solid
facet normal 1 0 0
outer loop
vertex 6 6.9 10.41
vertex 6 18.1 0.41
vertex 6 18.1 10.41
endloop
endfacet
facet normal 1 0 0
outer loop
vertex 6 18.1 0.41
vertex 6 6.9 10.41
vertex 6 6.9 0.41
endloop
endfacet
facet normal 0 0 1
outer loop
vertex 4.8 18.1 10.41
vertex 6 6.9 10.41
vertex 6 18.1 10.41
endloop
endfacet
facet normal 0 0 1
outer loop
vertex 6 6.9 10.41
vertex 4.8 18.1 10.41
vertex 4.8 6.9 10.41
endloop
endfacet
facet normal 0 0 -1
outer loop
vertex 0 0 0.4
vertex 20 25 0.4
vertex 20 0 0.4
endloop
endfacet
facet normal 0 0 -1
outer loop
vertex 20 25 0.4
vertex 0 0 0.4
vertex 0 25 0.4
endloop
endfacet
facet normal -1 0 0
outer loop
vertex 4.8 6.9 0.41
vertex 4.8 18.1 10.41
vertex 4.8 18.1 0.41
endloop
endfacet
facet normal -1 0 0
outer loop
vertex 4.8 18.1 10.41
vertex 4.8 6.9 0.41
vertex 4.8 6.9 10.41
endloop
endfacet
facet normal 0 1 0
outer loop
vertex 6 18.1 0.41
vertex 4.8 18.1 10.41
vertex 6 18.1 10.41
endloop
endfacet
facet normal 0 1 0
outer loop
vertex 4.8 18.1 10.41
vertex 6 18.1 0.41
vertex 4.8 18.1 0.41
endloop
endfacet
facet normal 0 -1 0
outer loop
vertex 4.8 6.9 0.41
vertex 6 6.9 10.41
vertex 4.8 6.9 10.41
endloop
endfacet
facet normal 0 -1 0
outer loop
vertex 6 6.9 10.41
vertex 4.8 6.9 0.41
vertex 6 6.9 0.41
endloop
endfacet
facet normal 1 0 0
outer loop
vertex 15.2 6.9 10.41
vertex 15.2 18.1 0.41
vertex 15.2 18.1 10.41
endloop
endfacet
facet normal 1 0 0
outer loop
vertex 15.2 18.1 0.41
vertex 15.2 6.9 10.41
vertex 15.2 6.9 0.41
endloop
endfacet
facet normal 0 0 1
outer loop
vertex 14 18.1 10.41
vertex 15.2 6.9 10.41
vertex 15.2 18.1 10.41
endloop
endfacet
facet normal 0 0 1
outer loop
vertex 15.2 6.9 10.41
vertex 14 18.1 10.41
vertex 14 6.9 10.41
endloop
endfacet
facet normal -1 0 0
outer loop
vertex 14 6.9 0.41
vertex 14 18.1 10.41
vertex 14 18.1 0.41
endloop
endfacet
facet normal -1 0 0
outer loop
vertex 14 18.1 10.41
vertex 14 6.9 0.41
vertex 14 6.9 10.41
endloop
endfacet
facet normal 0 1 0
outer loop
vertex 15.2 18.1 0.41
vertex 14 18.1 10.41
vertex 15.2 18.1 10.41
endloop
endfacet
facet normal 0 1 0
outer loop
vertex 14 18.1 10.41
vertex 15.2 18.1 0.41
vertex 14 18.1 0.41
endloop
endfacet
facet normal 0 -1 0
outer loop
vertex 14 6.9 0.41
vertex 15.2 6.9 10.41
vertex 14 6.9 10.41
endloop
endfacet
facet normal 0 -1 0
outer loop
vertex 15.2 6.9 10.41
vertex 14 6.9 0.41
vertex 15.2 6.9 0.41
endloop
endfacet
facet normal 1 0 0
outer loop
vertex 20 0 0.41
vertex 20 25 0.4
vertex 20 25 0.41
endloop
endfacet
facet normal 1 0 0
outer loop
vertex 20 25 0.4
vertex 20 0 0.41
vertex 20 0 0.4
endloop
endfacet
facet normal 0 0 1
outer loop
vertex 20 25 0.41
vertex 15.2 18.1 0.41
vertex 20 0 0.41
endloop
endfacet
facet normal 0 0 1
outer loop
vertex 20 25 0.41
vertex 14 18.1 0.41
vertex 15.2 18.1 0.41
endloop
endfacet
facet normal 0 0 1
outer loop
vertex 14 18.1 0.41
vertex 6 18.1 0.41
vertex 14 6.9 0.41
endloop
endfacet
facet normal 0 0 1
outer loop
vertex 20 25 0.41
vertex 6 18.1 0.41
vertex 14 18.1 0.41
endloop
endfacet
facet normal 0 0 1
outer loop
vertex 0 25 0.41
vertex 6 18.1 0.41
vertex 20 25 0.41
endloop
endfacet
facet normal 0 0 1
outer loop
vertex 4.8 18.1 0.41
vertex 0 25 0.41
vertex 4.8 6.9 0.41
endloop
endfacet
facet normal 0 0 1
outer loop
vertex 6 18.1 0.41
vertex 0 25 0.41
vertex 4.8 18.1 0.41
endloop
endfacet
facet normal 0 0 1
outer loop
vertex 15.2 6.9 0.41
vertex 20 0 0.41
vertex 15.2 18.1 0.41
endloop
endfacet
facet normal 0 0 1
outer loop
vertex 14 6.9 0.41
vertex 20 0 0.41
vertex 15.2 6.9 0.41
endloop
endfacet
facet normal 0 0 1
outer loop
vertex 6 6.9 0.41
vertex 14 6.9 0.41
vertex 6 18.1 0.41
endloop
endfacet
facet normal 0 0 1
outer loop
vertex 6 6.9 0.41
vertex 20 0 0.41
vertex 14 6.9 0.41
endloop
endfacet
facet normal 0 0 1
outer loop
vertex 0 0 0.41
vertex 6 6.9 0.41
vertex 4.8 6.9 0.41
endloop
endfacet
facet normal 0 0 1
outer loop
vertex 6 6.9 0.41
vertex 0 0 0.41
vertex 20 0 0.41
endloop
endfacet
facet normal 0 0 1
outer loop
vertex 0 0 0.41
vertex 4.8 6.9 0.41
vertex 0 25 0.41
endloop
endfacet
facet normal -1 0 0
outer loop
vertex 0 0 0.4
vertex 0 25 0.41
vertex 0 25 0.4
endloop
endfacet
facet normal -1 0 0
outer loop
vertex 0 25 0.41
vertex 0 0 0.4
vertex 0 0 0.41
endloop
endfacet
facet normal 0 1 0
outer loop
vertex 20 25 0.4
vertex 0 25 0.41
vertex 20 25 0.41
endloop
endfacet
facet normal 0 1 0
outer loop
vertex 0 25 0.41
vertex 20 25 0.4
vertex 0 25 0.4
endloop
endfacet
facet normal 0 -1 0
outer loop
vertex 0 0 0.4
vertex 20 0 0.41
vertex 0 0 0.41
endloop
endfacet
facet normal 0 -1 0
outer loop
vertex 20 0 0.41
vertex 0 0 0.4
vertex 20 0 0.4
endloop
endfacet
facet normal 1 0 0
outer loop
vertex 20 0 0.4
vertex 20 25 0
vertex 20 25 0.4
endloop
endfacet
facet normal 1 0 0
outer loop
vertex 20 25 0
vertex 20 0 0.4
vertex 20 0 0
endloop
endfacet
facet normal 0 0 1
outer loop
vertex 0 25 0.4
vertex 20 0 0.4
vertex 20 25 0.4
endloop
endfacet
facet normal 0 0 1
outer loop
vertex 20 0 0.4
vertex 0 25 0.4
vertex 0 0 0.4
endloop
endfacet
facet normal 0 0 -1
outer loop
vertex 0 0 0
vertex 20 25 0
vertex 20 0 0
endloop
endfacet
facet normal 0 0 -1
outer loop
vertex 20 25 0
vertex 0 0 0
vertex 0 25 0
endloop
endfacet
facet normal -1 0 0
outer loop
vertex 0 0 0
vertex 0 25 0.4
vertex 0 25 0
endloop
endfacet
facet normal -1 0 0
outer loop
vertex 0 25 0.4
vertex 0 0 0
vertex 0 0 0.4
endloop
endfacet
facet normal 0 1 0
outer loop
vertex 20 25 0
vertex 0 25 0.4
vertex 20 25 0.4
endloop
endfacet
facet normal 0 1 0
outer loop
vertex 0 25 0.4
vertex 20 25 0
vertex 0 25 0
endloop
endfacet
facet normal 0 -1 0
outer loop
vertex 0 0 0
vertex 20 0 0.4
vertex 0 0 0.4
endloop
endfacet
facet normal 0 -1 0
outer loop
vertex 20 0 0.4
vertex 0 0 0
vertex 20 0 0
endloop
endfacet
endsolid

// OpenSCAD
// file: ../../Base/PlacementOptions.scad
// Fischertechnik Box Foundation
// Placement Options

// Alignment
NoAlign = 0;
AlignLeft = 1;
AlignBottom = 2;
AlignCenter = 3;
AlignRight = 4;
AlignTop = 5;

// Element rotation degree steps
rotations = [0, -90, -180, -270];

// Rotation
NoRotation = 0;
Rotate0 = 0;
Rotate90 = 1;
Rotate180 = 2;
Rotate270 = 3;

// Docking (seen from above)
NoDock = -1;
DockLeft = 0;
DockTop = 1;
DockRight = 2;
DockCorner = 2;
DockBottom = 3;

// Web corners
LowerLeft = 0;
UpperLeft = 1;
UpperRight = 2;
LowerRight = 3;

// Web position relative to corner
LeftOfCorner = 0;
RightOfCorner = 1;
// file: ../../Base/Boxes.scad
// Fischertechnik Box Foundation
// Pre-designed Boxes

use <Constants.scad>

include <PlacementOptions.scad>

box190Width = 190;
box190Depth = 130;
box130Width = 130;
box130Depth = 95;

// Values are from an original ec3 box
topBottomDifference = 1.5;
outerHeight = 40;
innerHeight = 38.2;
baseThickness = outerHeight - innerHeight;
stackExcess = 5.7;
radius = 3.5;
wallThickness = 1.5;
tolerance = 0.2;
stackOffset = innerHeight - stackExcess;

boxUsageHeight = stackOffset;
boxWallThickness = wallThickness;
boxBaseThickness = baseThickness;
boxWebWidth = 3.0;

// getBoxWallThickness()
// Gets the wall thickness of a Fischertechnik Box
function getBoxWallThickness() = boxWallThickness;

// getBoxUsageHeight()
// Gets the usable height of a Fischertechnik box
function getBoxUsageHeight() = boxUsageHeight;

// getBoxInnerHeight()
// Gets the inner height of a Fischertechnik box, including the stack excess
function getBoxInnerHeight() = innerHeight;

// getBoxBaseThickness()
// Gets the thickness of the Fischertechnik box base.
function getBoxBaseThickness() = boxBaseThickness;

// getBoxWebWidth()
// Gets the width of a box web
function getBoxWebWidth() = boxWebWidth;

// getBox190Space()
// Gets the usable inner space of a Box 190 as an x/y-list
function getBox190Space() = [
    box190Width - 2*getBoxWallThickness() - topBottomDifference, 
    box190Depth - 2*getBoxWallThickness() - topBottomDifference ];

// BoxBase(width, depth)
// Creates an empty stackable Fischertechnik compatible box
// width = Outer width of the box (190, 130, ...)
// depth = Outer depth of the box (130, 95, ...)

module BoxBase(width, depth, height=outerHeight) {    
    thinPlate = 0.01;

    innerHeight = height - baseThickness;    
    
    module BodyPlate(width, depth) {
        translate([radius, radius])
        hull() {
            w = width-2*radius;
            d = depth-2*radius;
            cube([w, d, thinPlate]);
            cylinder(thinPlate, r=radius, $fn=getFragments());
            translate([w, 0])
                cylinder(thinPlate, r=radius, $fn=getFragments());
            translate([w, d])
                cylinder(thinPlate, r=radius, $fn=getFragments());
            translate([0, d])
                cylinder(thinPlate, r=radius, $fn=getFragments());
        }
    }
    
    module Body(tolerance=tolerance) {
        hull() {
            // Bottom with tolerance to fit into the original boxes when stacked
            translate([-wallThickness+tolerance, -wallThickness+tolerance, -baseThickness])
                BodyPlate(width-topBottomDifference-2*tolerance, depth-topBottomDifference-2*tolerance);
            
            // Top
            translate([-wallThickness-topBottomDifference/2, -wallThickness-topBottomDifference/2, innerHeight-thinPlate])
                BodyPlate(width, depth);
         }
    }

    module Cutoff() {
        hull() {
            coWidth = width - 2*wallThickness;
            coDepth = depth - 2*wallThickness;
            
            // Bottom
            BodyPlate(coWidth-topBottomDifference, coDepth-topBottomDifference);

            // Top
            translate([-topBottomDifference/2, -topBottomDifference/2, innerHeight+thinPlate]) 
                BodyPlate(coWidth, coDepth);
        }
    }
    
    difference() {        
        Body();
        Cutoff();
        stackOffset = innerHeight - stackExcess;
        translate([0, 0, stackOffset + baseThickness])
            Body(tolerance=0);
    }
}

// Creates the Fischertechnik empty box 130x190 mm and places it at position 0,0
// 190x130 are the outer sizes, the inner space is slightly smaller. Use getBox190Space() to get the inner sizes.
// The box is positioned that the usable inner space is at the 0,0,0 position. The

module Box190() {
    BoxBase(box190Width, box190Depth);
}

// Gets the usable inner space of a Box 130 as an x/y-list
function getBox130Space() = [
    box130Width - 2*getBoxWallThickness() - topBottomDifference, 
    box130Depth - 2*getBoxWallThickness() - topBottomDifference ];

// Creates the Fischertechnik empty box 95x130 mm and places it at position 0,0
// 190x130 are the outer sizes, the inner space is slightly smaller. Use getBox190Space() to get the inner sizes.
// The box is positioned that the usable inner space is at the 0,0,0 position. The

module Box130() {
    BoxBase(box130Width, box130Depth);
}

// Creates a web at the specified box walls
// corner 0 = LowerLeft, 1 = UpperLeft, 2 = UpperRight, 3 = LowerRight
// side 0 = LeftOfCorner, 1 = RightOfCorner
// distance = Distance in mm from the corner
// boxSpace = inner width and depth of the box (default: Box 190)
// webWidth = length of the web (default is 3 mms)
// webThickness = thickness of the web (default is 1 mm)

module BoxWeb(corner, side, distance, boxSpace=getBox190Space(), webWidth=getBoxWebWidth(), webThickness=1.0) {
    sink = getBoxWallThickness()/2;

    width = (corner % 2 == 0) ? 
            (side == LeftOfCorner ? webWidth : webThickness) :
            (side == LeftOfCorner ? webThickness : webWidth);

    depth = (corner % 2 == 0) ? 
            (side == RightOfCorner ? webWidth : webThickness) :
            (side == RightOfCorner ? webThickness : webWidth);
    
    xDiff = corner == LowerLeft ? 
                (side == LeftOfCorner ? -sink : distance) :
            (corner == UpperLeft ?                
                (side == LeftOfCorner ? distance : -sink) :
            (corner == UpperRight ?
                (side == LeftOfCorner ? boxSpace.x-webWidth+sink : boxSpace.x-distance-webThickness) :
                (side == LeftOfCorner ? boxSpace.x-distance-webThickness: boxSpace.x-webWidth+sink)));

    yDiff = corner == LowerLeft ? 
                (side == RightOfCorner ? -sink : distance) :
            (corner == UpperLeft ?
                (side == RightOfCorner ? boxSpace.y-distance : boxSpace.y-webWidth+sink) :
            (corner == UpperRight ?
                (side == RightOfCorner ? boxSpace.y-webWidth+sink : boxSpace.y-distance) :
                (side == RightOfCorner ? distance : -sink)));
    
    translate([xDiff, yDiff, -getExcess()])
        cube([width, depth, boxUsageHeight + 2*getExcess()]);
}
// file: ../../Base/Rotation.scad
// Fischertechnik Box Foundation
// Geometry Helpers Rotation

include <PlacementOptions.scad>

// getRotatedSpace(space, rotation=NoRotation)
// Rotates the space dependent on the specified rotation

function getRotatedSpace(space, rotation=NoRotation) = [
    (rotation == Rotate90 || rotation == Rotate270) ? space.y : space.x,
    (rotation == Rotate90 || rotation == Rotate270) ? space.x : space.y
];

// Rotates the given space around the fixed left lower corner
// space = the space the children needs as width/depth list [width,depth]
// rotation = 0 Rotate0 degrees, 1 Rotate90 degrees, 2 Rotate180 degrees, 3 Rotate270 degrees (equivalent to -90)

module RotateFix(space, rotation=NoRotation) {
    dy = (rotation == Rotate0 || rotation == Rotate270) ? 0 :
        (rotation == Rotate90) ? space.x :
        space.y;
    dx = (rotation < Rotate180) ? 0 :
        (rotation == Rotate180) ? space.x :
        space.y;
    
    translate([dx, dy, 0])
        rotate([0, 0, rotations[rotation]])
            children();
}
// file: ../../Base/Alignment.scad
// Fischertechnik Box Foundation
// Geometry Helpers Alignment

include <PlacementOptions.scad>

// getAlignedX(elementWidth, spaceWidth, align=AlignRight, offset=0)
// Gets the aligned X offset of an element with the given
// width in the given space.
// elementWidth = The width of the element to positon
// spaceWidth = The space where the element should be aligned
// align = 0 AlignLeft, 1 AlignCenter, 2 AlignRight
// offset = an optional offset from the aligned position. When
// aligned left or centered, then positive values are in X direction.
// When aligned right then positive values are in negative X direction.

function getAlignedX(elementWidth, spaceWidth, align=AlignRight, offset=0) =
    (align == AlignLeft) ?
        offset :
        ((align == AlignCenter) ?
        (spaceWidth - elementWidth)/2 + offset :
        spaceWidth - offset - elementWidth);

// getAlignedY(elementDepth, spaceDepth, align=AlignTop, offset=0)
// Gets the aligned Y offset of an element with the given
// depth in the given space.
// elementDepth = The depth of the element to positon
// spaceDepth = The space where the element should be aligned
// align = 0 AlignBottom, 1 AlignCenter, 2 AlignTop
// offset = an optional offset from the aligned position. When
// aligned bottom or centered, then positive values are in Y direction.
// When aligned top then positive values are in negative Y direction.

function getAlignedY(elementDepth, spaceDepth, align=AlignTop, offset=0) =
    (align == AlignBottom) ?
        offset :
        ((align == AlignCenter) ?
        (spaceDepth - elementDepth)/2 + offset :
        spaceDepth - offset - elementDepth);
// file: ../../Base/Placement.scad
// Fischertechnik Box Foundation
// Geometry Helpers Placement

use <Constants.scad>
use <Alignment.scad>
use <Rotation.scad>
use <Boxes.scad>

include <PlacementOptions.scad>

// Place(x=0, y=0, elementSpace=[0,0], alignX=AlignLeft, alignY=AlignBottom, rotation=Rotate0, boxSpace=getBox190Space())
// Places the child at the specified position
// y = Y-Position. This is a relative position when an X aligment is specified.
// x = X-Position. This is a relative position when an Y aligment is specified.
// elementSpace = space of the element to be placed [x,y]
// alignX = -1=NoAlign, 0 AlignLeft, 1 AlignCenter, 3 AlignRight (elementSpace and boxSpace required!)
// alignY = -1=NoAlign, 2 AlignBottom, 1 AlignCenter, 4 AlignTop (elementSpace and boxSpace required!)
// rotation = 0 Rotate0 0 degrees, 1 Rotate90 90 degrees, 
// 2 Rotate180 180 degrees, 3 Rotate270 270 degrees (equivalent to -90)
// boxSpace = Inner space of the box where the placement occurs [x,y] - default is Box 190x130 inner space

module Place(x=0, y=0, elementSpace=[0,0], 
  alignX=AlignLeft, alignY=AlignBottom, 
  rotation=NoRotation, boxSpace=getBox190Space()) {

    module Position(x, y, space, rotation=Rotate0) {
        translate([x, y, 0])
            RotateFix(space, rotation)
                children();
    }

    space = getRotatedSpace(elementSpace, rotation);
    alignedX = getAlignedX(space.x, boxSpace.x, alignX, x);
    alignedY = getAlignedY(space.y, boxSpace.y, alignY, y);
    Position(alignedX, alignedY, elementSpace, rotation)
        children();
}

// Center(space=getBox130Space(), elementSpace=[0,0])
// space = Space where the children is centered. For cylinder use centered=true and no elementSpace.
// elementSpace = space of the element to be centered [x,y]

module Center(space=getBox190Space(), elementSpace=[0,0]) {
    Place(elementSpace=elementSpace, boxSpace=space, alignX=AlignCenter, alignY=AlignCenter)
        children();
}

// CenterHorizontal(width=0, y=0, offset=0, space=getBox130Space())
// width = Width of the element to be placed.
// y = Y position of the element
// offset = Offset from the center position (negative will be left of the center)
// space = Space where the element is placed

module CenterHorizontal(width=0, y=0, offset=0, space=getBox190Space()) {
    Place(x=offset, y=y, elementSpace=[width, 0], boxSpace=space, alignX=AlignCenter)
        children(0);
}

// CenterVertical(depth=0, x=0, offset=0, space=getBox130Space())
// depth = Depth of the element to be placed.
// x = X position of the element
// offset = Offset from the center position (negative will be down of the center)
// space = Space where the element is placed

module CenterVertical(depth=0, x=0, offset=0, space=getBox190Space()) {
    Place(x=x, y=offset, elementSpace=[0, depth], boxSpace=space, alignY=AlignCenter)
        children(0);
}

// getIsVertical(align)
// True if the specified alignment needs a vertical orientation for a divider (AlignRight, AlignLeft)

function getIsVertical(align) = (align == AlignRight || align == AlignLeft);

// getIsHorizontal(align)
// True if the specified alignment needs a horizontal orientation for a divider (AlignTop, AlignBottom)

function getIsHorizontal(align) = (align == AlignTop || align == AlignBottom);
// file: ../../Elements/AxisClip10.scad
// Fischertechnik Box Library
// Axis for clip 10
// 31023

use <../ModelBase/Simple.scad>
use <../Base/Constants.scad>

width = 12;
depth = 12;
height = 23;
upperDiameter = 3.6;
clipHeight = 10;

// getAxisClip10Space()
// Gets the space of a frame for a clip 10 with spring ring (mot2)

function getAxisClip10Space() = [width, depth, height];

// AxisClip10(height, clipHeight)
// Axis for clip 10 with spring ring (mot2)
// height = Height of the complete axis
// clipHeight = Height of the rt for the clip (standard is 10, in mot3 its only 7)

module AxisClip10(height=height, clipHeight=clipHeight) {
    LeveledAxisWithSpace(height, height-clipHeight, getAxisClip10Space(), diameter=upperDiameter);
}

// Tests
color("lightgray")
AxisClip10();
// file: ../../Base/Constants.scad
// Fischertechnik Box Foundation
// Constants

// Constant values necessary for multiple elements

// Base constants
dividerThickness = 1.2;
excess = 0.01;
fragments = 90;
tolerance = 0.8;

// Gets the thickness of a divider 
function getDividerThickness() = dividerThickness;

// Gets the excess that is used to merge walls into each other
function getExcess() = excess;

// Gets amount of fragments of a cylinder
function getFragments() = fragments;

// Gets the inner tolerance of a frame to each side
function getTolerance() = tolerance;


// Fischertechnik specific constants
axisDiameter = 4;
axisBottomDiameter = axisDiameter + 1;
standardEdgeDistance = 2.5;
standardWebDistance = 11.5;
standardCornerLength = 15;
tubeWallFactor = 0.8;
smallPartsFrameHeight = 20;

// Gets axis diameter
function getAxisDiameter() = axisDiameter;

// Gets axis bottom diameter for thicker part at the bottom
function getAxisBottomDiameter() = axisBottomDiameter;

// gets the standard distance to the wall of the box for dockable frames with webs
function getStandardEdgeDistance() = standardEdgeDistance;

// gets the standard distance of each web to the corner of the dockable frame
function getStandardWebDistance() = standardWebDistance;

// gets the standard length of the corner walls of a dockable frame
function getStandardCornerLength() = standardCornerLength;

// gets the wall thickness of a tube.
function getTubeWallThickness() = tubeWallFactor * getDividerThickness();

// gets the frame height for docked small parts boxes.
function getSmallPartsFrameHeight() = smallPartsFrameHeight;
// file: ../../Elements/HolderWinchDrum.scad
// Fischertechnik Box Library
// Holder for Winch Drum
// 31016

use <../Base/Constants.scad>
use <../Base/Placement.scad>
use <../ModelBase/Simple.scad>

width = 20;
depth = 25;
height = 10;

// getWinchDrumHolderSpace()
// Gets the space the winch drum holder needs as width and depth (.x and .y as a list)

function getHolderWinchDrumSpace() = [width, depth, height];

// HolderWinchDrum()
// Two walls for holding the 31016 winch drum.

module HolderWinchDrum() {
    holderDepth = 11.2;
    holderDistance = 8;
    
    Space(getHolderWinchDrumSpace());
    
    module Holders() {
        Wall([getDividerThickness(), holderDepth, height]);
        translate([holderDistance + getDividerThickness(), 0])
            Wall([getDividerThickness(), holderDepth, height]);
    }
    
    Center(getHolderWinchDrumSpace(), [holderDistance + 2*getDividerThickness(), holderDepth]) {
        Holders();
    }
}

// Tests
color("lightgray")
HolderWinchDrum();
// file: ../TestPrint.scad
// 3D Print Test Base

use <../Base/Constants.scad>

use <../Elements/AxisClip10.scad>

module TestPrint(elementSpace) {
    cube([elementSpace.x, elementSpace.y, 0.4]);
    translate([0,0,0.4+getExcess()]) {
        children();
    }
}

TestPrint(getAxisClip10Space())
    AxisClip10();
// main file
// 3D Print Test
// HolderWinchDrum

use <../TestPrint.scad>
use <../../Elements/HolderWinchDrum.scad>

TestPrint(getHolderWinchDrumSpace())
    HolderWinchDrum();
